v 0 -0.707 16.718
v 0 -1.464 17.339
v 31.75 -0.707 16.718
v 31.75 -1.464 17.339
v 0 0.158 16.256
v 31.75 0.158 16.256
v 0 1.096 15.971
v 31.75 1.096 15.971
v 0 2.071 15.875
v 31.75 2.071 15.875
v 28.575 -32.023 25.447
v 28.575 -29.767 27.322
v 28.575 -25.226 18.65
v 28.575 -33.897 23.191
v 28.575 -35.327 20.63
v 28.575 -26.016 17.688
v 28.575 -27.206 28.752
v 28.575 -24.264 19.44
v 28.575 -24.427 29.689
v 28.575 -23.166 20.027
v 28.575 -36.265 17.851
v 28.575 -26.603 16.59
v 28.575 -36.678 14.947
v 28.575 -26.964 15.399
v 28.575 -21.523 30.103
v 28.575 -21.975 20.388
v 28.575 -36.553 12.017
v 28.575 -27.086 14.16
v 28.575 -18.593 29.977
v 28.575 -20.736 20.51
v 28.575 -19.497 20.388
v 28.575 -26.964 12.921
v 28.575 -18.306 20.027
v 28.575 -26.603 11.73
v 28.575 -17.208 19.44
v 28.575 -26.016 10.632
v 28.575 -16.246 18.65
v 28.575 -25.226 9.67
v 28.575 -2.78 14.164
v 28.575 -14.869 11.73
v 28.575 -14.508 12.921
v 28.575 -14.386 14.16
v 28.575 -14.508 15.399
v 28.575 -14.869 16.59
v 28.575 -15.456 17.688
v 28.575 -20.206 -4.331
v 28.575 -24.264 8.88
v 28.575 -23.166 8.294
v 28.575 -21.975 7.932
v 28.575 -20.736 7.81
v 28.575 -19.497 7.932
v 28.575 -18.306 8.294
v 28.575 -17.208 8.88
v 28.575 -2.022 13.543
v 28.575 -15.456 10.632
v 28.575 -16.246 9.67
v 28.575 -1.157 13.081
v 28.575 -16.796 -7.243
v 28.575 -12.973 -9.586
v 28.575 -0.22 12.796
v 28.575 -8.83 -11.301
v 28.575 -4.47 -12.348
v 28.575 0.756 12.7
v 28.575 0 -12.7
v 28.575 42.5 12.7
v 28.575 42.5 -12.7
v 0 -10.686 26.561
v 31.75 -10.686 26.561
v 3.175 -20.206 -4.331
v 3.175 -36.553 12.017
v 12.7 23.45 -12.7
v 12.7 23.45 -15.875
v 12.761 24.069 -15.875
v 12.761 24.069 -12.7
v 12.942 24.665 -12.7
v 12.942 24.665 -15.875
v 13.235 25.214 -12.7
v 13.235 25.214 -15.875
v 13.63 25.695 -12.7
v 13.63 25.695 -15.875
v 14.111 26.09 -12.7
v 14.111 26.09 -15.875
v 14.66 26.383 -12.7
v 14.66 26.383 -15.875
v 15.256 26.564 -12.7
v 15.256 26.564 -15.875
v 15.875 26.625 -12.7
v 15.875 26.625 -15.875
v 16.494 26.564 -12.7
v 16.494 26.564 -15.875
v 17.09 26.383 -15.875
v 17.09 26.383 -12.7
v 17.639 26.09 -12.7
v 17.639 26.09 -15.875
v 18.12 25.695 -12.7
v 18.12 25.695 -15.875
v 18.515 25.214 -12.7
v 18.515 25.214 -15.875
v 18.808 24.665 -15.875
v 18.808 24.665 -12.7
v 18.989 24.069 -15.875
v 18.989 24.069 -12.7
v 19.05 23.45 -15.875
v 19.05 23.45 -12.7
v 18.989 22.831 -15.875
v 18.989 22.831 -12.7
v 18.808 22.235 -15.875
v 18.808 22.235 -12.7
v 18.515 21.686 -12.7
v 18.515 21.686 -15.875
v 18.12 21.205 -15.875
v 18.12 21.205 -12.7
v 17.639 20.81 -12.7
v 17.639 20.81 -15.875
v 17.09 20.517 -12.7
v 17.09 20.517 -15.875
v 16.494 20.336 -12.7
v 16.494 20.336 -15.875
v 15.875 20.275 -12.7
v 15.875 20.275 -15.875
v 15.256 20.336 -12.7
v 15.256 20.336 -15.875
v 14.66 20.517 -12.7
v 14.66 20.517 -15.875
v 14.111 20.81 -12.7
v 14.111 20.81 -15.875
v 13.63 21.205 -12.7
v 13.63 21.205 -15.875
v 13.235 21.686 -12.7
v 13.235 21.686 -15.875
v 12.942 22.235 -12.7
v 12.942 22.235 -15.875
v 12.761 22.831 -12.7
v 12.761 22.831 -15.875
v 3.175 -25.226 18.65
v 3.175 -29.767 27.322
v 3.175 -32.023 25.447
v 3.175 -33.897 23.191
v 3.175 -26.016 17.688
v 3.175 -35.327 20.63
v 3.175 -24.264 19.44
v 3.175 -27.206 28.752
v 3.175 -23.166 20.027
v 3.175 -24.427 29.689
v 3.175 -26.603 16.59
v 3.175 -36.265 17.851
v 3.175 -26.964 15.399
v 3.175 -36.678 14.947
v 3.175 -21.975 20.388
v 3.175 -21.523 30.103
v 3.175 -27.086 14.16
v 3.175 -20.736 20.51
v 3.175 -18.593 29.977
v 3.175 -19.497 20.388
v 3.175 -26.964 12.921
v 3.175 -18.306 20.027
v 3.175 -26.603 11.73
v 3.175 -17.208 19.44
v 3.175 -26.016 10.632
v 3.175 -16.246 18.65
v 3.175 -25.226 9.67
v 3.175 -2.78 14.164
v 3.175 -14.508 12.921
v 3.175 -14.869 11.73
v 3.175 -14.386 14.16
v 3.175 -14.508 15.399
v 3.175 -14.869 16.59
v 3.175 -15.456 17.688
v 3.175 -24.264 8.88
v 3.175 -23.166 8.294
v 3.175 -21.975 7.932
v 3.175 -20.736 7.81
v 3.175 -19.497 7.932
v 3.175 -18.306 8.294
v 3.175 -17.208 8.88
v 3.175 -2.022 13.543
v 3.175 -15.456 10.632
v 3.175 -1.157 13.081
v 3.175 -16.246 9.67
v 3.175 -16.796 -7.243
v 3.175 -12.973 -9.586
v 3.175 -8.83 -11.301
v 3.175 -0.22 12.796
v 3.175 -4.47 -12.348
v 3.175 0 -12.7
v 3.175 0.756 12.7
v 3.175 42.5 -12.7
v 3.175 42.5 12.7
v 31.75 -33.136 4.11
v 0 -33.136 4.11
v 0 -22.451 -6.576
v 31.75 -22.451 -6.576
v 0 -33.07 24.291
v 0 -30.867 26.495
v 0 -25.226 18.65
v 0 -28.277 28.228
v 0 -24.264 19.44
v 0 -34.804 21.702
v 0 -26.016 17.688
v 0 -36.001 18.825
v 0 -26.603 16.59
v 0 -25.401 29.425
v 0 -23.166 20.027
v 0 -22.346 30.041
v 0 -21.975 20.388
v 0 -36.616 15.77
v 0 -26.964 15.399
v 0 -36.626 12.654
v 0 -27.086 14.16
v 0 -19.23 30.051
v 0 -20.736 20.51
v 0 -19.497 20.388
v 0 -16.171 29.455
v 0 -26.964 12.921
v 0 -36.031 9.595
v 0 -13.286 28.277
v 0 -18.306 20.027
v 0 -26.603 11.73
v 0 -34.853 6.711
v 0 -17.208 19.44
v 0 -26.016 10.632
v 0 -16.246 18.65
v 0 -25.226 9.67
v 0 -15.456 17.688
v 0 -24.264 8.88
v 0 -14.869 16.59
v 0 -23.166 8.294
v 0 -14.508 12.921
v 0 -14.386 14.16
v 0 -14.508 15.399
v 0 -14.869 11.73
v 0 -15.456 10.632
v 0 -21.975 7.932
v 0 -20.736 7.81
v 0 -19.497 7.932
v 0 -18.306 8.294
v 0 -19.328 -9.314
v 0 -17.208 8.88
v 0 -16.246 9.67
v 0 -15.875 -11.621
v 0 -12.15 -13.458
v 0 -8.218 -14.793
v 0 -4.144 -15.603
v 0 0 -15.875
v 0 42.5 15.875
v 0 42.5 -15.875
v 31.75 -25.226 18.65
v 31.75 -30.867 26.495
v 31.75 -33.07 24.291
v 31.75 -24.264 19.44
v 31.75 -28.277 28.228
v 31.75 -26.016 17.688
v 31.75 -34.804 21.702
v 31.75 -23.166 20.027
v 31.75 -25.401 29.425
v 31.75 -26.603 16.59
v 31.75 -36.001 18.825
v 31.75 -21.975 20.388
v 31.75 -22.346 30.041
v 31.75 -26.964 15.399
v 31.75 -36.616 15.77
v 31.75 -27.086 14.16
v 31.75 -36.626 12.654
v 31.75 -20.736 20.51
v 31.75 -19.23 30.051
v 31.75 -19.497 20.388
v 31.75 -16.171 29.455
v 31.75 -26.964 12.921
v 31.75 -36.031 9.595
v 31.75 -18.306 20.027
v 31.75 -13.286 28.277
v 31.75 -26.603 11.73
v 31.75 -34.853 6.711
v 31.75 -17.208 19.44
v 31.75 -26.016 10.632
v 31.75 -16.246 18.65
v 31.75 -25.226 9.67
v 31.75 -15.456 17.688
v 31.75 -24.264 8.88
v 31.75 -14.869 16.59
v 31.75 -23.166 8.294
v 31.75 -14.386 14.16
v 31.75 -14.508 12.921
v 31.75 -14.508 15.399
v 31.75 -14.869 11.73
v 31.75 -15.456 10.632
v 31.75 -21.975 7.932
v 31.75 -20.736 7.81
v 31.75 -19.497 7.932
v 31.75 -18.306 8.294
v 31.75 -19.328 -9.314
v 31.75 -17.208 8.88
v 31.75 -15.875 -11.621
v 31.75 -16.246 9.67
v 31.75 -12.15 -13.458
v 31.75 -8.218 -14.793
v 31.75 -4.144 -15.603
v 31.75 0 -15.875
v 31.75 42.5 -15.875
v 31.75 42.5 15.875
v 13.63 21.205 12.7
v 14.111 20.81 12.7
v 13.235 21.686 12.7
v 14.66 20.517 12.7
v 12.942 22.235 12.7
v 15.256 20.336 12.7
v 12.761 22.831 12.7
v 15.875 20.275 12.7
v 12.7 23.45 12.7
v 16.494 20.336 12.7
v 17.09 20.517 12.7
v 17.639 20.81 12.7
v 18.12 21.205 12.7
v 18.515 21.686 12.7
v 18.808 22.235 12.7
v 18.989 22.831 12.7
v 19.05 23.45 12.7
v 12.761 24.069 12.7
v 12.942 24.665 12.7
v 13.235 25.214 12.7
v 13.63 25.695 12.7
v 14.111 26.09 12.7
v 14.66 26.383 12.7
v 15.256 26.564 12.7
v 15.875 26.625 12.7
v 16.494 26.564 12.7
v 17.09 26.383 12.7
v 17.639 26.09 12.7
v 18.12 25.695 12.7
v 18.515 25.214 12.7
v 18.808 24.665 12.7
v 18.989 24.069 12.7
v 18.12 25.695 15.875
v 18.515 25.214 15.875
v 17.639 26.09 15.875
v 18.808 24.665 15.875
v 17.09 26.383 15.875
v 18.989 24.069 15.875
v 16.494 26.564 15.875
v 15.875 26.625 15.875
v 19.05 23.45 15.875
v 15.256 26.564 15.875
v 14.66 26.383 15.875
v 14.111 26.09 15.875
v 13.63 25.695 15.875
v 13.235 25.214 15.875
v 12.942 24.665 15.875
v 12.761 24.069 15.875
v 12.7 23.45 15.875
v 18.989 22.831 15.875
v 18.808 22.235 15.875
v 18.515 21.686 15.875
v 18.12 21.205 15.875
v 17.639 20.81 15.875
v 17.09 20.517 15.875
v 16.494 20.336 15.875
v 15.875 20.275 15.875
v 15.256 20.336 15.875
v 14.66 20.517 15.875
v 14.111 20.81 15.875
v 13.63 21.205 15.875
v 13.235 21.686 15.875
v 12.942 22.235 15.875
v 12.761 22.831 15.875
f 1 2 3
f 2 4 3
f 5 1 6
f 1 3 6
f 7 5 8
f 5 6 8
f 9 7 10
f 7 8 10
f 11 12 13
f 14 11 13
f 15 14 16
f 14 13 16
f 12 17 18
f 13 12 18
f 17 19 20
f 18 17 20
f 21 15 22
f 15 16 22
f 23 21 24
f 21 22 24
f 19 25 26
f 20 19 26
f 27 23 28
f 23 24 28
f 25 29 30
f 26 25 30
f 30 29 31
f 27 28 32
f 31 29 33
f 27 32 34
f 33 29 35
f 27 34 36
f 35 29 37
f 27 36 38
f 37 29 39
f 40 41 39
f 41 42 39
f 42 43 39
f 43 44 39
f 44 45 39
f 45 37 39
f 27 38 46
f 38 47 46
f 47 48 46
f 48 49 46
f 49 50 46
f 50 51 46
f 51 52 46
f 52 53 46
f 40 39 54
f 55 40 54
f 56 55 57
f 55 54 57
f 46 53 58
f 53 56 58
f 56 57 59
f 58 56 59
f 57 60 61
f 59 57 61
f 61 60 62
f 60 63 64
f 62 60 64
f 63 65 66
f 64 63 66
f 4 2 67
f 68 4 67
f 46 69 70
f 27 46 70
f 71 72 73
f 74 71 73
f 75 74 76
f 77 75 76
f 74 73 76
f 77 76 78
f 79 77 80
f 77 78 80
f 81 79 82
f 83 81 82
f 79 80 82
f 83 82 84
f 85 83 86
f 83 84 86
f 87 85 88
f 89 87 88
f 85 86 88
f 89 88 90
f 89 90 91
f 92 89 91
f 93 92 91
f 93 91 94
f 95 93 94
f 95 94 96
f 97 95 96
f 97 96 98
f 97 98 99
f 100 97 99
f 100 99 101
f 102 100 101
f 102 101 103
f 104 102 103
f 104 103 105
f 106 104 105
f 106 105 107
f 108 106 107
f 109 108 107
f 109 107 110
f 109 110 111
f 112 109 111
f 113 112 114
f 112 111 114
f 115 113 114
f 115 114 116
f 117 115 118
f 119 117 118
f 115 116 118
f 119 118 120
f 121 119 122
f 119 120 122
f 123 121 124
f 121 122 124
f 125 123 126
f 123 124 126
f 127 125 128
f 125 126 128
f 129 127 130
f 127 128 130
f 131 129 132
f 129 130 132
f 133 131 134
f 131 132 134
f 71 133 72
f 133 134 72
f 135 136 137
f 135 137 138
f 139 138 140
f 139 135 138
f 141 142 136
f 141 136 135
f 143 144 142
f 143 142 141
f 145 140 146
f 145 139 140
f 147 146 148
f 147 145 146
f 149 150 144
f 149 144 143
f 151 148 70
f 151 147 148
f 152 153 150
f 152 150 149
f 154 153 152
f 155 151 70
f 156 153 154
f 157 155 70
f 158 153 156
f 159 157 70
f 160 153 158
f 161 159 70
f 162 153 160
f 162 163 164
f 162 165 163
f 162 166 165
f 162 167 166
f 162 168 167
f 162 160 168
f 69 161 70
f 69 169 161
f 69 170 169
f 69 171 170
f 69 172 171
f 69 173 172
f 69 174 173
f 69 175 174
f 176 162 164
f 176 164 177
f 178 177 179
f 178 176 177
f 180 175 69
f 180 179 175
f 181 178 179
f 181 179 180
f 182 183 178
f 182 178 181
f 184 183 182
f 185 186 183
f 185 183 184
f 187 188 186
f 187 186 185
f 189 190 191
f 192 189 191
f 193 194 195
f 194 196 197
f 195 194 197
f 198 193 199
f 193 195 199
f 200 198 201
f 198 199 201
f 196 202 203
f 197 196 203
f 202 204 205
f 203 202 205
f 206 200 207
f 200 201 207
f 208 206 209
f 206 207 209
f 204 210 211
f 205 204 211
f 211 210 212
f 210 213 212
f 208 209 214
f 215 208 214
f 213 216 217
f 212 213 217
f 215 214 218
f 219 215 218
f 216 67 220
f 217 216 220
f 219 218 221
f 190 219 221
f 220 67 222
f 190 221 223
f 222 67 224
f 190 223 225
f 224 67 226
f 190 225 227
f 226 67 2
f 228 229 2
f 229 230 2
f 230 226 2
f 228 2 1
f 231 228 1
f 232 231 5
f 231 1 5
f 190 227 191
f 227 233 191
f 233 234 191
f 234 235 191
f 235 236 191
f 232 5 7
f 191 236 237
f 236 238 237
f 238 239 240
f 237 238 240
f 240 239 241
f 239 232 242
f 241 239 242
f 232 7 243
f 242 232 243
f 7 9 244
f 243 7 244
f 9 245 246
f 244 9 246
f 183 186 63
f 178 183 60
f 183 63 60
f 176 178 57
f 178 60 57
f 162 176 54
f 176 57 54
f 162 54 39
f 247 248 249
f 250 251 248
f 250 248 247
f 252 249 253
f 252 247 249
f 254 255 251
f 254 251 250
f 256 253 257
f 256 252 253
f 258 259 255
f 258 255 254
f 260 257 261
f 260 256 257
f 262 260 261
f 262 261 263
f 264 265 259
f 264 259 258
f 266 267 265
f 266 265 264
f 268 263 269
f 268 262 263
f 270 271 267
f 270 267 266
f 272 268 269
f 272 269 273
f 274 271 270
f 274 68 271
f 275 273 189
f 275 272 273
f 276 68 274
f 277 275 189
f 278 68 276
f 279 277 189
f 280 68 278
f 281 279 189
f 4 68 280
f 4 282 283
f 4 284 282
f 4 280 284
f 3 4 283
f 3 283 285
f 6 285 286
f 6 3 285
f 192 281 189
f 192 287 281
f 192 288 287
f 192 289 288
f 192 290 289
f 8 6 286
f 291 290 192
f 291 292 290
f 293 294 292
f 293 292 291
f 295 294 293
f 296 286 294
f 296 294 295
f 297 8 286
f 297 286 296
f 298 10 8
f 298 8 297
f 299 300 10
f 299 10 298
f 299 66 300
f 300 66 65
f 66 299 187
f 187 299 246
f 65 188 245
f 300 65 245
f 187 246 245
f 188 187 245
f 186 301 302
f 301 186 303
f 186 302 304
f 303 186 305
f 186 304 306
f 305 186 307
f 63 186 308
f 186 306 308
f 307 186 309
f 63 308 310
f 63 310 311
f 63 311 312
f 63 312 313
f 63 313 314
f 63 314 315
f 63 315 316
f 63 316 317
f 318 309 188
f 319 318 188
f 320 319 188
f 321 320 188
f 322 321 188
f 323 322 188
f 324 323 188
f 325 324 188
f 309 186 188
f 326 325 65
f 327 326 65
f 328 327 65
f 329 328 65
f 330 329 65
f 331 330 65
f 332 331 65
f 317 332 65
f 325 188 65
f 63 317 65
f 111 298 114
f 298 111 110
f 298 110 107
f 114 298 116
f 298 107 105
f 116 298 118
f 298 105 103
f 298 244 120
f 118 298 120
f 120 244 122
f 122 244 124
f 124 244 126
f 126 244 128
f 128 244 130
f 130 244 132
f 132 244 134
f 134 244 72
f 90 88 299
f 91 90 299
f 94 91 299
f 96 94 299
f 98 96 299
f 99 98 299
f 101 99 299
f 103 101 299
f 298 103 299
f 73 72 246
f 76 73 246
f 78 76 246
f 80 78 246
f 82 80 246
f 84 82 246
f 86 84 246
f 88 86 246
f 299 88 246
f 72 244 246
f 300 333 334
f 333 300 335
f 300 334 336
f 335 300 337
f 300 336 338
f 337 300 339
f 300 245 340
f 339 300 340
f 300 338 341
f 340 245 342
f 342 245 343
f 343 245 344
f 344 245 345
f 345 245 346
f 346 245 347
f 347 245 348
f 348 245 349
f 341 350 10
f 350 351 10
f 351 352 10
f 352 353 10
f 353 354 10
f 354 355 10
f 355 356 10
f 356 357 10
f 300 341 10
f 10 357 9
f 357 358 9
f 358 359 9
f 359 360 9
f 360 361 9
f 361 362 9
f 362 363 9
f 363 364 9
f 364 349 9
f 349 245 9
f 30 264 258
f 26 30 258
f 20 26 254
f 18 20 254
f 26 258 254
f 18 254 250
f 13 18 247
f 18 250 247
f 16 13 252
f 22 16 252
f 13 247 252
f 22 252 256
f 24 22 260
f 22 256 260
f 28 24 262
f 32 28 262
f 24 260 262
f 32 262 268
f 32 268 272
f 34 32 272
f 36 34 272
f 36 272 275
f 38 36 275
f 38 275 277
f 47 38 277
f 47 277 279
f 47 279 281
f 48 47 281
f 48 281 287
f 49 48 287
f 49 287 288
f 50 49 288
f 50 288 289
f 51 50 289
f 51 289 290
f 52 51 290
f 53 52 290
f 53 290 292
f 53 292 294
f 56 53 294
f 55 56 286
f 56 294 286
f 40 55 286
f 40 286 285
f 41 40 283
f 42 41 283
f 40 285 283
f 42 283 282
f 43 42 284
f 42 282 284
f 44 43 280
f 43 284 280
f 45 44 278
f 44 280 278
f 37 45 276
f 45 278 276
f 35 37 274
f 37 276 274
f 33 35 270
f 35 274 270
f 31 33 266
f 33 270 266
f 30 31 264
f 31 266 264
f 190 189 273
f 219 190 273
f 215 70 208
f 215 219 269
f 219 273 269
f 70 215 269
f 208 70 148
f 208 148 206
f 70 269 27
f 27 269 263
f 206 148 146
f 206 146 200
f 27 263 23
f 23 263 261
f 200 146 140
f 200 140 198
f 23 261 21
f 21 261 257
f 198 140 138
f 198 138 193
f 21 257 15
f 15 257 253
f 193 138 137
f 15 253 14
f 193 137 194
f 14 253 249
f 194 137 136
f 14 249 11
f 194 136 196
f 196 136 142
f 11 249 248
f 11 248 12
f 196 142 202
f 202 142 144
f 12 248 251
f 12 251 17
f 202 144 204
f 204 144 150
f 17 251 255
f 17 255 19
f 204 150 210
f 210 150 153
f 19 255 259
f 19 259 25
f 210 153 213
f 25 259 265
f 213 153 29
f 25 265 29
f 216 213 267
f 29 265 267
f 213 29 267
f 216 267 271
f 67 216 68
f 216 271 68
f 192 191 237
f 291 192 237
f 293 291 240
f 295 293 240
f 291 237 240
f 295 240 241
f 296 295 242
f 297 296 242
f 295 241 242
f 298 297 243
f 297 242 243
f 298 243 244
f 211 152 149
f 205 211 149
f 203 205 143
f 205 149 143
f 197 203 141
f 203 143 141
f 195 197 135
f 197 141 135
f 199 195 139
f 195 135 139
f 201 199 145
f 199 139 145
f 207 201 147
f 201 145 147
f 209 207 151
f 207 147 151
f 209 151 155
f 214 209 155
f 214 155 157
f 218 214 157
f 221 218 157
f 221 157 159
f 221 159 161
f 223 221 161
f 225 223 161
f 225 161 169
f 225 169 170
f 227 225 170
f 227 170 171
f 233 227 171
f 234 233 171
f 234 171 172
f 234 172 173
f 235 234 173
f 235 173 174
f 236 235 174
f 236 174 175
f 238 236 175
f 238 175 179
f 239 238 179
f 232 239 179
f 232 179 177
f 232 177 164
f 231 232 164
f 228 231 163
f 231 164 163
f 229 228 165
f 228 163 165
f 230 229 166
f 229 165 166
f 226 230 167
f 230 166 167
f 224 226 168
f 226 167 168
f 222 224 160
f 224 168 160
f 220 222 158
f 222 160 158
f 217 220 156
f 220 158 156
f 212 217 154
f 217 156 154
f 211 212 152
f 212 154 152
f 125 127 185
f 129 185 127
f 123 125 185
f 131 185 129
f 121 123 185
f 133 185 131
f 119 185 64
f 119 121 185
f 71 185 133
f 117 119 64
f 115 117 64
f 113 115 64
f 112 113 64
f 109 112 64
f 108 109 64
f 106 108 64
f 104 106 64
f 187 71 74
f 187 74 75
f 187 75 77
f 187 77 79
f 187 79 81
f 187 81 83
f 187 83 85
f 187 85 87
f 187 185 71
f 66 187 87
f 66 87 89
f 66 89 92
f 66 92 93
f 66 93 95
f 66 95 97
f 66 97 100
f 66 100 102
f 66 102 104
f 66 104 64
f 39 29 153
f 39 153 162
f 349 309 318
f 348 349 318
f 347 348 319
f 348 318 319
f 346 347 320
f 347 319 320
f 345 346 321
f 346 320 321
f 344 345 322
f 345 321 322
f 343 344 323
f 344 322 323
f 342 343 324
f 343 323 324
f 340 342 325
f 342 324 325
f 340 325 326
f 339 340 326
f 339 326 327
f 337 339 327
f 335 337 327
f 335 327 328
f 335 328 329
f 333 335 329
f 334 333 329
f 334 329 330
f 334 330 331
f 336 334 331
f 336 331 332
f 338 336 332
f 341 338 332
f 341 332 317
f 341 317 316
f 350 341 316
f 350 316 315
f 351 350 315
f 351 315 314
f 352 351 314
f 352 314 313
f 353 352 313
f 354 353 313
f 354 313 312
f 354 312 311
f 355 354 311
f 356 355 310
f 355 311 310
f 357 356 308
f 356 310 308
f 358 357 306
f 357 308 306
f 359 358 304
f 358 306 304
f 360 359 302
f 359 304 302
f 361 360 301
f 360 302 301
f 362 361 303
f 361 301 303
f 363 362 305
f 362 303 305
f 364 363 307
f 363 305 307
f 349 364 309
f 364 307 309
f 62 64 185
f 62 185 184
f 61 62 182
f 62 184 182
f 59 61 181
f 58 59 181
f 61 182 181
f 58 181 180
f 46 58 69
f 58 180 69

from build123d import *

# Parameters (mm, degrees)
BOSS_EXTRUDE1_DEPTH = 31.75
CUT_EXTRUDE2_START  = -3.175
CUT_EXTRUDE2_DEPTH  = 25.4
SKETCH4_W           = 25.4
SKETCH4_H           = 25.4
CUT_EXTRUDE3_DEPTH  = 3.175
SKETCH6_W           = 25.4
SKETCH6_H           = 25.4
CUT_EXTRUDE5_DEPTH  = 3.175
FILLET1_R           = 5
CUT_EXTRUDE6_REACH  = 79.895
SKETCH8_R           = 3.175
CUT_EXTRUDE7_REACH  = 69.69
SKETCH9_R           = 6.35
CUT_EXTRUDE8_DEPTH  = 68.689586975


with BuildPart() as part:
    # Sketch1 → Boss-Extrude1 (new body)
    with BuildSketch(Plane(origin=(0, 0, 0), x_dir=(0, 0, -1), z_dir=(1, 0, 0))):
        with BuildLine():
            Line((15.875, 42.5), (-15.875, 42.5))
            Line((-15.875, 42.5), (-15.875, 0))
            Line((-15.875, 0), (-38.855970389, -22.980970389))
            Line((-38.855970389, -22.980970389), (-16.405330086, -45.431610691))
            Line((-16.405330086, -45.431610691), (6.575640303, -22.450640303))
            ThreePointArc((6.575640303, -22.450640303), (13.458175157, -12.150198978), (15.875, 0))
            Line((15.875, 0), (15.875, 42.5))
        make_face()
    extrude(amount=BOSS_EXTRUDE1_DEPTH)

    # Sketch3 → Cut-Extrude2 (cut)
    with BuildSketch(Plane.ZY.offset(CUT_EXTRUDE2_START)):
        with BuildLine():
            Line((16.405330086, -40.941482631), (34.365842328, -22.980970389))
            Line((34.365842328, -22.980970389), (12.7, -1.315128061))
            Line((12.7, -1.315128061), (12.7, 39.325))
            Line((12.7, 39.325), (-12.7, 39.325))
            Line((-12.7, 39.325), (-12.7, 0))
            ThreePointArc((-12.7, 0), (-10.524857642, -10.93517908), (-4.330576272, -20.205576272))
            Line((-4.330576272, -20.205576272), (16.405330086, -40.941482631))
        make_face()
    extrude(amount=-CUT_EXTRUDE2_DEPTH, mode=Mode.SUBTRACT)

    # Sketch4 → Cut-Extrude3 (cut)
    with BuildSketch(Plane(origin=(0, 42.5, 0), x_dir=(1, 0, 0), z_dir=(0, 1, 0))):
        with Locations((15.875, 0)):
            Rectangle(SKETCH4_W, SKETCH4_H)
    extrude(amount=-CUT_EXTRUDE3_DEPTH, mode=Mode.SUBTRACT)

    # Sketch6 → Cut-Extrude5 (cut)
    with BuildSketch(Plane(origin=(0, -30.918470389, 30.918470389), x_dir=(1, 0, 0), z_dir=(0, -0.7071067811865518, 0.7071067811865434))):
        with Locations((15.875, -4.649679849)):
            Rectangle(SKETCH6_W, SKETCH6_H)
    extrude(amount=-CUT_EXTRUDE5_DEPTH, mode=Mode.SUBTRACT)

    # Fillet1
    fillet1_edges = [part.edges().sort_by_distance(p)[0] for p in [
        (15.875, 0, 15.875),
        (15.875, -1.315128061, 12.7),
    ]]
    fillet(fillet1_edges, radius=FILLET1_R)

    # Cut-Extrude6: up to this face of the body (flat: up to its plane)
    cut_extrude6_end = Plane(part.part.faces().sort_by_distance((15.875, 22.285533906, 15.875))[0])
    # Sketch8 → Cut-Extrude6 (cut, up to the picked face)
    with BuildSketch(Plane(origin=(0, 0, -15.875), x_dir=(-1, 0, 0), z_dir=(0, 0, -1)), mode=Mode.PRIVATE) as cut_extrude6_sk1:
        with Locations((-15.875, 23.45)):
            Circle(SKETCH8_R)
    cut_extrude6_tool1 = split(extrude(cut_extrude6_sk1.sketch, amount=-CUT_EXTRUDE6_REACH, mode=Mode.PRIVATE), bisect_by=cut_extrude6_end, keep=Keep.BOTH, mode=Mode.PRIVATE)
    add(cut_extrude6_tool1.solids().sort_by(Axis((15.875, 23.45, -15.875), (0, 0, 1)))[0], mode=Mode.SUBTRACT)

    # Cut-Extrude7: up to this face of the body (flat: up to its plane)
    cut_extrude7_end = Plane(part.part.faces().sort_by_distance((0, 0.759502888, 5.54562078))[0])
    # Sketch9 → Cut-Extrude7 (cut, up to the picked face)
    with BuildSketch(Plane(origin=(31.75, 0, 0), x_dir=(0, 0, -1), z_dir=(1, 0, 0)), mode=Mode.PRIVATE) as cut_extrude7_sk1:
        with Locations(Location((-14.160266056, -20.735906358, 0), (0, 0, 180))):
            Circle(SKETCH9_R)
    cut_extrude7_tool1 = split(extrude(cut_extrude7_sk1.sketch, amount=-CUT_EXTRUDE7_REACH, mode=Mode.PRIVATE), bisect_by=cut_extrude7_end, keep=Keep.BOTH, mode=Mode.PRIVATE)
    add(cut_extrude7_tool1.solids().sort_by(Axis((31.75, -20.735906, 14.160266), (-1, 0, 0)))[0], mode=Mode.SUBTRACT)

    # Sketch11 → Cut-Extrude8 (cut, through all)
    with BuildSketch(Plane(origin=(31.75, 0, 0), x_dir=(0, 0, -1), z_dir=(1, 0, 0))):
        with BuildLine():
            ThreePointArc((-4.10994949, -33.136230095), (-25.446915068, -32.022555371), (-26.560589793, -10.685589793))
            Line((-26.560589793, -10.685589793), (-38.855970389, -22.980970389))
            Line((-38.855970389, -22.980970389), (-16.405330086, -45.431610691))
            Line((-16.405330086, -45.431610691), (-4.10994949, -33.136230095))
        make_face()
    extrude(amount=-CUT_EXTRUDE8_DEPTH, mode=Mode.SUBTRACT)


solid = part.part
